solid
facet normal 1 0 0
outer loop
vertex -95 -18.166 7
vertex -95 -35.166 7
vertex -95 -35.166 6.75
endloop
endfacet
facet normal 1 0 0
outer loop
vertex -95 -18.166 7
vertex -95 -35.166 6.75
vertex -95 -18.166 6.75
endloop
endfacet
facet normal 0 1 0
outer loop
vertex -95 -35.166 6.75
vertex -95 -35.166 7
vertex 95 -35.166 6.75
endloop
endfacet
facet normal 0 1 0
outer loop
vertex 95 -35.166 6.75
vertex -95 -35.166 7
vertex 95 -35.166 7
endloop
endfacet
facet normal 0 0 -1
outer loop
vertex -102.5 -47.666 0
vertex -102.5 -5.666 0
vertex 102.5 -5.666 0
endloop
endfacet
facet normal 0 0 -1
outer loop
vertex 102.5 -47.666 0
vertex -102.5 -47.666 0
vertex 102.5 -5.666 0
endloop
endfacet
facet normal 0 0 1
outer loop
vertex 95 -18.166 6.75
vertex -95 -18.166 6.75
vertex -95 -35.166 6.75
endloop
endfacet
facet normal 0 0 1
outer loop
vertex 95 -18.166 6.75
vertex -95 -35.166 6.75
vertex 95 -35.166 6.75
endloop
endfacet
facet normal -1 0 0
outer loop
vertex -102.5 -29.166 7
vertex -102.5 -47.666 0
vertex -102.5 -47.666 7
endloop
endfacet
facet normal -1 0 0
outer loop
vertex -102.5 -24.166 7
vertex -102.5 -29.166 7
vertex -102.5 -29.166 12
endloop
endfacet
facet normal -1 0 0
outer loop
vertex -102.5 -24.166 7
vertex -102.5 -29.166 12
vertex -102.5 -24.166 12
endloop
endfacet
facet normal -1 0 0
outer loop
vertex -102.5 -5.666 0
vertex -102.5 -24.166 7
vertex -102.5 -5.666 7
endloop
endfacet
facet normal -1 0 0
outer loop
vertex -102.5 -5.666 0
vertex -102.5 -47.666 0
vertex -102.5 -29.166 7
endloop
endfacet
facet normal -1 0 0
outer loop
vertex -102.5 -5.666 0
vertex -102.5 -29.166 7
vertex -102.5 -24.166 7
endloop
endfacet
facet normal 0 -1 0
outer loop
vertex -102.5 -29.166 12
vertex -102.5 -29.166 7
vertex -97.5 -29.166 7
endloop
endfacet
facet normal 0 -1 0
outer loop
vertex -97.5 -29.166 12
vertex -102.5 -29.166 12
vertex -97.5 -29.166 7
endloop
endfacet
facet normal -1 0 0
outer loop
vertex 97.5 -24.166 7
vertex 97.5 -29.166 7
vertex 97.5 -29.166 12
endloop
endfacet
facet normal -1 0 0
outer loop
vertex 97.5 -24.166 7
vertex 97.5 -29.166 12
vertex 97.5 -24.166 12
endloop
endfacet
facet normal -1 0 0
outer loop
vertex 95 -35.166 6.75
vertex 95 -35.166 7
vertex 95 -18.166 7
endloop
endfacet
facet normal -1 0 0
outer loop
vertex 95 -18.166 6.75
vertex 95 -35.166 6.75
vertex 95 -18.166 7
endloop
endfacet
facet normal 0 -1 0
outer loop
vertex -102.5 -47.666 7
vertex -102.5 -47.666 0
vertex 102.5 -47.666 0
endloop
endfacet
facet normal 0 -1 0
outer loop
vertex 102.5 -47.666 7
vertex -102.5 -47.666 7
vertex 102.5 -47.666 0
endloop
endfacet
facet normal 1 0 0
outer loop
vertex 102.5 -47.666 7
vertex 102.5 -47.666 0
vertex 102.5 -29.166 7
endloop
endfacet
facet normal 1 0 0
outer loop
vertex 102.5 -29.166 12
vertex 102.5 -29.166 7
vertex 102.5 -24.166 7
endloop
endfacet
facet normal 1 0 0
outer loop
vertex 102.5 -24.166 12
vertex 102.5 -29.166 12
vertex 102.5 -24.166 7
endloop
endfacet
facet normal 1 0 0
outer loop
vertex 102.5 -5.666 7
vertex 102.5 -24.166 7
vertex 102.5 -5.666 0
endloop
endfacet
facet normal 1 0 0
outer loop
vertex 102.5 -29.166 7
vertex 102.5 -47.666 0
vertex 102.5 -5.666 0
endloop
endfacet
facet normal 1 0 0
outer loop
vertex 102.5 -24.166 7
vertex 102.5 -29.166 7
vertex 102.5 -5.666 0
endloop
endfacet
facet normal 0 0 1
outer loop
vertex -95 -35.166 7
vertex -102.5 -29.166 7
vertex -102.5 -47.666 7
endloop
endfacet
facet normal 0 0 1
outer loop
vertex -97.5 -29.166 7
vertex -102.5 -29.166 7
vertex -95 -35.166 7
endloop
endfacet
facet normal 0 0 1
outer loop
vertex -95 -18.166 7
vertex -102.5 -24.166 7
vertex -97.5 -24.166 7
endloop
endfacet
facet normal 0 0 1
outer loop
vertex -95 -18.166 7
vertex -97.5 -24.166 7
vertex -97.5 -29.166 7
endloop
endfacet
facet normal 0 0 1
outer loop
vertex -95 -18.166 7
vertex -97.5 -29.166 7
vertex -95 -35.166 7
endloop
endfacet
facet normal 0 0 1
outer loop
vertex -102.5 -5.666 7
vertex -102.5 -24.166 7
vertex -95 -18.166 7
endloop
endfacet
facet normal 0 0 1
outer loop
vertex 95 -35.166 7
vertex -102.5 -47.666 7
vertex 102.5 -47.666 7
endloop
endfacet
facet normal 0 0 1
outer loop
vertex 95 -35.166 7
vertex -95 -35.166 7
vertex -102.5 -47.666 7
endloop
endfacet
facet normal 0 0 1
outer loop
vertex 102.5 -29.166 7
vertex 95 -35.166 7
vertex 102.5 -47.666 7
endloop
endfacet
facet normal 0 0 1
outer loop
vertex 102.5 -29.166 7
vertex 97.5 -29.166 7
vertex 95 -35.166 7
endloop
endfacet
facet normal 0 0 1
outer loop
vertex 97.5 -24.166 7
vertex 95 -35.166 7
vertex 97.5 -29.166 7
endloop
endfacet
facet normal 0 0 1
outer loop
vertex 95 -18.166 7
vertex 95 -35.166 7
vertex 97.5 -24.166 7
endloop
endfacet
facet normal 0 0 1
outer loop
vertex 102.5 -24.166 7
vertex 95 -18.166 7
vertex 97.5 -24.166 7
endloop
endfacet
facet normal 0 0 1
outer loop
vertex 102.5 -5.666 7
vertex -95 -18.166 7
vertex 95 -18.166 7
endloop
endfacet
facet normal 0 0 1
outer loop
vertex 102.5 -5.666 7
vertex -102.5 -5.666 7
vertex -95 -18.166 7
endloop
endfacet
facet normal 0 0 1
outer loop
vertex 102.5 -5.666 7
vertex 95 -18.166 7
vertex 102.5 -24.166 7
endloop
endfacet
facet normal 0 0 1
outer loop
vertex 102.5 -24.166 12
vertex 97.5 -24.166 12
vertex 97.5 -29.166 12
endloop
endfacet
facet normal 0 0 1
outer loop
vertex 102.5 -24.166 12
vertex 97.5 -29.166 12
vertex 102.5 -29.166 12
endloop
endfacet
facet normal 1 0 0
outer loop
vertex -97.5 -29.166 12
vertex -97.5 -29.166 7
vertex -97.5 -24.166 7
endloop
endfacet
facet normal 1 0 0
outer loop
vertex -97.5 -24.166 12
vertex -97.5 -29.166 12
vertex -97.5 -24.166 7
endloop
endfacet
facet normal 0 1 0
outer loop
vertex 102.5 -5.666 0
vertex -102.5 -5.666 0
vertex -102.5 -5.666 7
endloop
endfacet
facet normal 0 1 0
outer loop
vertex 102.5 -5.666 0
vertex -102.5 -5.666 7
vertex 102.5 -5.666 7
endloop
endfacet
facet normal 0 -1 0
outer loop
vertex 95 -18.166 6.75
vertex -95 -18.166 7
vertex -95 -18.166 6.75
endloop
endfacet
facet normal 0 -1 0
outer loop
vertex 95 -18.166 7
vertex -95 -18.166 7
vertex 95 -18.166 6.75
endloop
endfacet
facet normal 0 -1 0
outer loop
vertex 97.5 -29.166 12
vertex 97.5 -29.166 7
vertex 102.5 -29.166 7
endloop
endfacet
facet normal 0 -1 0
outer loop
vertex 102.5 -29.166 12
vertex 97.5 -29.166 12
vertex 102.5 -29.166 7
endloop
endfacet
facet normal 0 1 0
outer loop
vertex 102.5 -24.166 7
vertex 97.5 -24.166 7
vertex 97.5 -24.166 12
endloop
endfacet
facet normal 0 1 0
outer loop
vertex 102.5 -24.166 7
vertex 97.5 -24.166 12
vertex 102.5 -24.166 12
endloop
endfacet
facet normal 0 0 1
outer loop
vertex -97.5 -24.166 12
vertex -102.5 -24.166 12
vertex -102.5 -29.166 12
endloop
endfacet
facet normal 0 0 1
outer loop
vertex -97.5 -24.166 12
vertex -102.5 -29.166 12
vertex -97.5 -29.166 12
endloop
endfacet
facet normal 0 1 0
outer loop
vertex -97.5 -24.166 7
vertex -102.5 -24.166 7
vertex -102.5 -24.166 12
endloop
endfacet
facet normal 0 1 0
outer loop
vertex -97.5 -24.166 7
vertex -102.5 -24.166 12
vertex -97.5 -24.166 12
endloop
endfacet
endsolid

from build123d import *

# Parameters (mm, degrees)
F0_W     = 205
F0_H     = 42
F1_DEPTH = 7
F2_W     = 5
F2_H     = 5
F3_DEPTH = 5
F2_W_2   = 190
F2_H_2   = 17
F4_DEPTH = 0.25


with BuildPart() as f1:
    # F0 (on Top) → F1 (new body)
    with BuildSketch(Plane.XY):
        with Locations((0, -26.665802)):
            Rectangle(F0_W, F0_H)
    extrude(amount=F1_DEPTH)

    # F2 (on face) → F3 (join)
    with BuildSketch(Plane.XY.offset(7)):
        with Locations((-100, -26.665802)):
            Rectangle(F2_W, F2_H)
        with Locations((100, -26.665802)):
            Rectangle(F2_W, F2_H)
    extrude(amount=F3_DEPTH)

    # F2 (on face) → F4 (cut)
    with BuildSketch(Plane.XY.offset(7)):
        with Locations((0, -26.665802)):
            Rectangle(F2_W_2, F2_H_2)
    extrude(amount=-F4_DEPTH, mode=Mode.SUBTRACT)


solid = f1.part
